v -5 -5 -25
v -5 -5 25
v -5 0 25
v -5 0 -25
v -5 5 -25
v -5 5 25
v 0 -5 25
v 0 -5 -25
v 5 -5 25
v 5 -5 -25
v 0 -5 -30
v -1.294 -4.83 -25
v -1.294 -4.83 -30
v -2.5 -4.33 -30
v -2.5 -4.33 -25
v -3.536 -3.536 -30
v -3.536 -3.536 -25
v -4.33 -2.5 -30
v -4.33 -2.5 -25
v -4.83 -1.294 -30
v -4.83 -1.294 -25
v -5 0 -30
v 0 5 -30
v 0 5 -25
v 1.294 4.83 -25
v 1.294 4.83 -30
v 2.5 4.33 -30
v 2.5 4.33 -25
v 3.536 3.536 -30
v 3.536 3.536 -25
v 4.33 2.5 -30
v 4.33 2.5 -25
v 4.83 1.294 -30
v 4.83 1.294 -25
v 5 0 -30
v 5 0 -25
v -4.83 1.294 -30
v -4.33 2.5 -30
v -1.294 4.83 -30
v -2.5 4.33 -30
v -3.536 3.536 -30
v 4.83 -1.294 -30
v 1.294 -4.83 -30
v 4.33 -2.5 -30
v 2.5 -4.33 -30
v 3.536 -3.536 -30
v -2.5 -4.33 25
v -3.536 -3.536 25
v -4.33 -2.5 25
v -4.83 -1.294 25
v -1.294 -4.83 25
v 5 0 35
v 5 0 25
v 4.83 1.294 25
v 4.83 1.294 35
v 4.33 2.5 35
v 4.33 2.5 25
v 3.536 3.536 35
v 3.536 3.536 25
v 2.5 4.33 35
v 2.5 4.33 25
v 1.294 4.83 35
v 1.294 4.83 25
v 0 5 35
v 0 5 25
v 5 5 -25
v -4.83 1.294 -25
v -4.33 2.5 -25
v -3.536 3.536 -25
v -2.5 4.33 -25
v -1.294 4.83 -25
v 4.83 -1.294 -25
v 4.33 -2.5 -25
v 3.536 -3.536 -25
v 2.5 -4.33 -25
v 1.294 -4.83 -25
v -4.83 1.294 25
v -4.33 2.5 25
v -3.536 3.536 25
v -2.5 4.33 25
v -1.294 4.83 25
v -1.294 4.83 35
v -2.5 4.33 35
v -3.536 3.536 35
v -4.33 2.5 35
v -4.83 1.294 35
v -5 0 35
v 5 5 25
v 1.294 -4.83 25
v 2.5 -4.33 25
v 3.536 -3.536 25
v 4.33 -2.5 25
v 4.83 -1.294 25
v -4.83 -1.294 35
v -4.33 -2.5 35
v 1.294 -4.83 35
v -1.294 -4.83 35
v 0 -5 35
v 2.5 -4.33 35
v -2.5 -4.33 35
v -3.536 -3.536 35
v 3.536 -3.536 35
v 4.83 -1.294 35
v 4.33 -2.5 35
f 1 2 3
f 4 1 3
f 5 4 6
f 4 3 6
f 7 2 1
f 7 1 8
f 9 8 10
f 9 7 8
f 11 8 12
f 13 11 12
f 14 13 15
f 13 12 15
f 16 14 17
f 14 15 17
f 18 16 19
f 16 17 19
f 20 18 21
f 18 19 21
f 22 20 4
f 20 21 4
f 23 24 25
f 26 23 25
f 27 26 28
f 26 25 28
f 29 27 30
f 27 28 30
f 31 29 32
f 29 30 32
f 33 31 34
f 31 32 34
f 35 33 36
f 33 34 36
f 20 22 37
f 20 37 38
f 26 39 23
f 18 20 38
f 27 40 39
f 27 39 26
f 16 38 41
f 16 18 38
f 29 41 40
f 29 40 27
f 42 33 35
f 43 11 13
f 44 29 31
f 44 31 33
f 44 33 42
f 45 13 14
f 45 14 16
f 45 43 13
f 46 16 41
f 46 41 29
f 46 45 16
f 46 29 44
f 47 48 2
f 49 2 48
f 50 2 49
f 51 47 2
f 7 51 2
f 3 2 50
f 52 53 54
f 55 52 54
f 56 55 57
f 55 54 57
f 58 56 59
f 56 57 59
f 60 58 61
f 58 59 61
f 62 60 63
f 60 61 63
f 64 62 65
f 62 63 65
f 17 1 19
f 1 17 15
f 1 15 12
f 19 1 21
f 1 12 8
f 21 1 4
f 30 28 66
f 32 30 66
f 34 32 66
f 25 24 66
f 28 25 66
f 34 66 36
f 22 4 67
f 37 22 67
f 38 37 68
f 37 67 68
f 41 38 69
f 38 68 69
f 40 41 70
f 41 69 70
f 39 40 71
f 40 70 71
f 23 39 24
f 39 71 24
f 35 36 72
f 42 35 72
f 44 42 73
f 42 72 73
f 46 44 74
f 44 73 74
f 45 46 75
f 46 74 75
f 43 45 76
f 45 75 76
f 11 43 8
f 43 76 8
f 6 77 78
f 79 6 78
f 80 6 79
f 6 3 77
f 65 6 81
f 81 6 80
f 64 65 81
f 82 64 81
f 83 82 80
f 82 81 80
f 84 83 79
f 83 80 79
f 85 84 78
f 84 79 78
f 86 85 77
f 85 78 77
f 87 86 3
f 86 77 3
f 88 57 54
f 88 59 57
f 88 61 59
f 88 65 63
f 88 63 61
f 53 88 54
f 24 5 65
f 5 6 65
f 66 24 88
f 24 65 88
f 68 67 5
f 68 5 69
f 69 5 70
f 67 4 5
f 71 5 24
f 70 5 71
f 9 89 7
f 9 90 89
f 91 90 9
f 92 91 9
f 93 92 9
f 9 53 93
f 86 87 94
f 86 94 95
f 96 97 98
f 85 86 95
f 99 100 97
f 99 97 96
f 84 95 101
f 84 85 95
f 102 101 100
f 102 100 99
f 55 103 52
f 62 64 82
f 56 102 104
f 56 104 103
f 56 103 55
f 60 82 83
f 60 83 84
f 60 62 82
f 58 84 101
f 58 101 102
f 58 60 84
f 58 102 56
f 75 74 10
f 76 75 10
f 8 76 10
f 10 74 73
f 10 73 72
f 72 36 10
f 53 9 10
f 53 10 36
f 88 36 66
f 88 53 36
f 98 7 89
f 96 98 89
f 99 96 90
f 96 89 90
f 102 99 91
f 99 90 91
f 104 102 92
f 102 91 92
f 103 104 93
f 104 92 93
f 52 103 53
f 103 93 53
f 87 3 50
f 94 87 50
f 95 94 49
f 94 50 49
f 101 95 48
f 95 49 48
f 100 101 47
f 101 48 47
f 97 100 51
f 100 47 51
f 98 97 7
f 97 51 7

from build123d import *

# Parameters (mm, degrees)
F0_W     = 10
F0_H     = 10
F1_DEPTH = 25
F3_DEPTH = 5
F5_DEPTH = 10


with BuildPart() as f1:
    # F0 (on Top) → F1 (new body, symmetric)
    with BuildSketch(Plane.XY):
        Rectangle(F0_W, F0_H)
    extrude(amount=F1_DEPTH, both=True)

    # F2 (on face) → F3 (join)
    with BuildSketch(Plane(origin=(0, 0, -25), x_dir=(1, 0, 0), z_dir=(0, 0, -1))):
        with BuildLine():
            ThreePointArc((0, -5), (3.5355339059, -3.5355339059), (5, 0))
            ThreePointArc((5, 0), (3.5355339059, 3.5355339059), (0, 5))
            ThreePointArc((0, 5), (-3.5355339059, 3.5355339059), (-5, 0))
            ThreePointArc((-5, 0), (-3.5355339059, -3.5355339059), (0, -5))
        make_face()
    extrude(amount=F3_DEPTH)

    # F4 (on face) → F5 (join)
    with BuildSketch(Plane.XY.offset(25)):
        with BuildLine():
            ThreePointArc((0, -5), (3.5355339059, -3.5355339059), (5, 0))
            ThreePointArc((5, 0), (3.5355339059, 3.5355339059), (0, 5))
            ThreePointArc((0, 5), (-3.5355339059, 3.5355339059), (-5, 0))
            ThreePointArc((-5, 0), (-3.5355339059, -3.5355339059), (0, -5))
        make_face()
    extrude(amount=F5_DEPTH)


solid = f1.part
